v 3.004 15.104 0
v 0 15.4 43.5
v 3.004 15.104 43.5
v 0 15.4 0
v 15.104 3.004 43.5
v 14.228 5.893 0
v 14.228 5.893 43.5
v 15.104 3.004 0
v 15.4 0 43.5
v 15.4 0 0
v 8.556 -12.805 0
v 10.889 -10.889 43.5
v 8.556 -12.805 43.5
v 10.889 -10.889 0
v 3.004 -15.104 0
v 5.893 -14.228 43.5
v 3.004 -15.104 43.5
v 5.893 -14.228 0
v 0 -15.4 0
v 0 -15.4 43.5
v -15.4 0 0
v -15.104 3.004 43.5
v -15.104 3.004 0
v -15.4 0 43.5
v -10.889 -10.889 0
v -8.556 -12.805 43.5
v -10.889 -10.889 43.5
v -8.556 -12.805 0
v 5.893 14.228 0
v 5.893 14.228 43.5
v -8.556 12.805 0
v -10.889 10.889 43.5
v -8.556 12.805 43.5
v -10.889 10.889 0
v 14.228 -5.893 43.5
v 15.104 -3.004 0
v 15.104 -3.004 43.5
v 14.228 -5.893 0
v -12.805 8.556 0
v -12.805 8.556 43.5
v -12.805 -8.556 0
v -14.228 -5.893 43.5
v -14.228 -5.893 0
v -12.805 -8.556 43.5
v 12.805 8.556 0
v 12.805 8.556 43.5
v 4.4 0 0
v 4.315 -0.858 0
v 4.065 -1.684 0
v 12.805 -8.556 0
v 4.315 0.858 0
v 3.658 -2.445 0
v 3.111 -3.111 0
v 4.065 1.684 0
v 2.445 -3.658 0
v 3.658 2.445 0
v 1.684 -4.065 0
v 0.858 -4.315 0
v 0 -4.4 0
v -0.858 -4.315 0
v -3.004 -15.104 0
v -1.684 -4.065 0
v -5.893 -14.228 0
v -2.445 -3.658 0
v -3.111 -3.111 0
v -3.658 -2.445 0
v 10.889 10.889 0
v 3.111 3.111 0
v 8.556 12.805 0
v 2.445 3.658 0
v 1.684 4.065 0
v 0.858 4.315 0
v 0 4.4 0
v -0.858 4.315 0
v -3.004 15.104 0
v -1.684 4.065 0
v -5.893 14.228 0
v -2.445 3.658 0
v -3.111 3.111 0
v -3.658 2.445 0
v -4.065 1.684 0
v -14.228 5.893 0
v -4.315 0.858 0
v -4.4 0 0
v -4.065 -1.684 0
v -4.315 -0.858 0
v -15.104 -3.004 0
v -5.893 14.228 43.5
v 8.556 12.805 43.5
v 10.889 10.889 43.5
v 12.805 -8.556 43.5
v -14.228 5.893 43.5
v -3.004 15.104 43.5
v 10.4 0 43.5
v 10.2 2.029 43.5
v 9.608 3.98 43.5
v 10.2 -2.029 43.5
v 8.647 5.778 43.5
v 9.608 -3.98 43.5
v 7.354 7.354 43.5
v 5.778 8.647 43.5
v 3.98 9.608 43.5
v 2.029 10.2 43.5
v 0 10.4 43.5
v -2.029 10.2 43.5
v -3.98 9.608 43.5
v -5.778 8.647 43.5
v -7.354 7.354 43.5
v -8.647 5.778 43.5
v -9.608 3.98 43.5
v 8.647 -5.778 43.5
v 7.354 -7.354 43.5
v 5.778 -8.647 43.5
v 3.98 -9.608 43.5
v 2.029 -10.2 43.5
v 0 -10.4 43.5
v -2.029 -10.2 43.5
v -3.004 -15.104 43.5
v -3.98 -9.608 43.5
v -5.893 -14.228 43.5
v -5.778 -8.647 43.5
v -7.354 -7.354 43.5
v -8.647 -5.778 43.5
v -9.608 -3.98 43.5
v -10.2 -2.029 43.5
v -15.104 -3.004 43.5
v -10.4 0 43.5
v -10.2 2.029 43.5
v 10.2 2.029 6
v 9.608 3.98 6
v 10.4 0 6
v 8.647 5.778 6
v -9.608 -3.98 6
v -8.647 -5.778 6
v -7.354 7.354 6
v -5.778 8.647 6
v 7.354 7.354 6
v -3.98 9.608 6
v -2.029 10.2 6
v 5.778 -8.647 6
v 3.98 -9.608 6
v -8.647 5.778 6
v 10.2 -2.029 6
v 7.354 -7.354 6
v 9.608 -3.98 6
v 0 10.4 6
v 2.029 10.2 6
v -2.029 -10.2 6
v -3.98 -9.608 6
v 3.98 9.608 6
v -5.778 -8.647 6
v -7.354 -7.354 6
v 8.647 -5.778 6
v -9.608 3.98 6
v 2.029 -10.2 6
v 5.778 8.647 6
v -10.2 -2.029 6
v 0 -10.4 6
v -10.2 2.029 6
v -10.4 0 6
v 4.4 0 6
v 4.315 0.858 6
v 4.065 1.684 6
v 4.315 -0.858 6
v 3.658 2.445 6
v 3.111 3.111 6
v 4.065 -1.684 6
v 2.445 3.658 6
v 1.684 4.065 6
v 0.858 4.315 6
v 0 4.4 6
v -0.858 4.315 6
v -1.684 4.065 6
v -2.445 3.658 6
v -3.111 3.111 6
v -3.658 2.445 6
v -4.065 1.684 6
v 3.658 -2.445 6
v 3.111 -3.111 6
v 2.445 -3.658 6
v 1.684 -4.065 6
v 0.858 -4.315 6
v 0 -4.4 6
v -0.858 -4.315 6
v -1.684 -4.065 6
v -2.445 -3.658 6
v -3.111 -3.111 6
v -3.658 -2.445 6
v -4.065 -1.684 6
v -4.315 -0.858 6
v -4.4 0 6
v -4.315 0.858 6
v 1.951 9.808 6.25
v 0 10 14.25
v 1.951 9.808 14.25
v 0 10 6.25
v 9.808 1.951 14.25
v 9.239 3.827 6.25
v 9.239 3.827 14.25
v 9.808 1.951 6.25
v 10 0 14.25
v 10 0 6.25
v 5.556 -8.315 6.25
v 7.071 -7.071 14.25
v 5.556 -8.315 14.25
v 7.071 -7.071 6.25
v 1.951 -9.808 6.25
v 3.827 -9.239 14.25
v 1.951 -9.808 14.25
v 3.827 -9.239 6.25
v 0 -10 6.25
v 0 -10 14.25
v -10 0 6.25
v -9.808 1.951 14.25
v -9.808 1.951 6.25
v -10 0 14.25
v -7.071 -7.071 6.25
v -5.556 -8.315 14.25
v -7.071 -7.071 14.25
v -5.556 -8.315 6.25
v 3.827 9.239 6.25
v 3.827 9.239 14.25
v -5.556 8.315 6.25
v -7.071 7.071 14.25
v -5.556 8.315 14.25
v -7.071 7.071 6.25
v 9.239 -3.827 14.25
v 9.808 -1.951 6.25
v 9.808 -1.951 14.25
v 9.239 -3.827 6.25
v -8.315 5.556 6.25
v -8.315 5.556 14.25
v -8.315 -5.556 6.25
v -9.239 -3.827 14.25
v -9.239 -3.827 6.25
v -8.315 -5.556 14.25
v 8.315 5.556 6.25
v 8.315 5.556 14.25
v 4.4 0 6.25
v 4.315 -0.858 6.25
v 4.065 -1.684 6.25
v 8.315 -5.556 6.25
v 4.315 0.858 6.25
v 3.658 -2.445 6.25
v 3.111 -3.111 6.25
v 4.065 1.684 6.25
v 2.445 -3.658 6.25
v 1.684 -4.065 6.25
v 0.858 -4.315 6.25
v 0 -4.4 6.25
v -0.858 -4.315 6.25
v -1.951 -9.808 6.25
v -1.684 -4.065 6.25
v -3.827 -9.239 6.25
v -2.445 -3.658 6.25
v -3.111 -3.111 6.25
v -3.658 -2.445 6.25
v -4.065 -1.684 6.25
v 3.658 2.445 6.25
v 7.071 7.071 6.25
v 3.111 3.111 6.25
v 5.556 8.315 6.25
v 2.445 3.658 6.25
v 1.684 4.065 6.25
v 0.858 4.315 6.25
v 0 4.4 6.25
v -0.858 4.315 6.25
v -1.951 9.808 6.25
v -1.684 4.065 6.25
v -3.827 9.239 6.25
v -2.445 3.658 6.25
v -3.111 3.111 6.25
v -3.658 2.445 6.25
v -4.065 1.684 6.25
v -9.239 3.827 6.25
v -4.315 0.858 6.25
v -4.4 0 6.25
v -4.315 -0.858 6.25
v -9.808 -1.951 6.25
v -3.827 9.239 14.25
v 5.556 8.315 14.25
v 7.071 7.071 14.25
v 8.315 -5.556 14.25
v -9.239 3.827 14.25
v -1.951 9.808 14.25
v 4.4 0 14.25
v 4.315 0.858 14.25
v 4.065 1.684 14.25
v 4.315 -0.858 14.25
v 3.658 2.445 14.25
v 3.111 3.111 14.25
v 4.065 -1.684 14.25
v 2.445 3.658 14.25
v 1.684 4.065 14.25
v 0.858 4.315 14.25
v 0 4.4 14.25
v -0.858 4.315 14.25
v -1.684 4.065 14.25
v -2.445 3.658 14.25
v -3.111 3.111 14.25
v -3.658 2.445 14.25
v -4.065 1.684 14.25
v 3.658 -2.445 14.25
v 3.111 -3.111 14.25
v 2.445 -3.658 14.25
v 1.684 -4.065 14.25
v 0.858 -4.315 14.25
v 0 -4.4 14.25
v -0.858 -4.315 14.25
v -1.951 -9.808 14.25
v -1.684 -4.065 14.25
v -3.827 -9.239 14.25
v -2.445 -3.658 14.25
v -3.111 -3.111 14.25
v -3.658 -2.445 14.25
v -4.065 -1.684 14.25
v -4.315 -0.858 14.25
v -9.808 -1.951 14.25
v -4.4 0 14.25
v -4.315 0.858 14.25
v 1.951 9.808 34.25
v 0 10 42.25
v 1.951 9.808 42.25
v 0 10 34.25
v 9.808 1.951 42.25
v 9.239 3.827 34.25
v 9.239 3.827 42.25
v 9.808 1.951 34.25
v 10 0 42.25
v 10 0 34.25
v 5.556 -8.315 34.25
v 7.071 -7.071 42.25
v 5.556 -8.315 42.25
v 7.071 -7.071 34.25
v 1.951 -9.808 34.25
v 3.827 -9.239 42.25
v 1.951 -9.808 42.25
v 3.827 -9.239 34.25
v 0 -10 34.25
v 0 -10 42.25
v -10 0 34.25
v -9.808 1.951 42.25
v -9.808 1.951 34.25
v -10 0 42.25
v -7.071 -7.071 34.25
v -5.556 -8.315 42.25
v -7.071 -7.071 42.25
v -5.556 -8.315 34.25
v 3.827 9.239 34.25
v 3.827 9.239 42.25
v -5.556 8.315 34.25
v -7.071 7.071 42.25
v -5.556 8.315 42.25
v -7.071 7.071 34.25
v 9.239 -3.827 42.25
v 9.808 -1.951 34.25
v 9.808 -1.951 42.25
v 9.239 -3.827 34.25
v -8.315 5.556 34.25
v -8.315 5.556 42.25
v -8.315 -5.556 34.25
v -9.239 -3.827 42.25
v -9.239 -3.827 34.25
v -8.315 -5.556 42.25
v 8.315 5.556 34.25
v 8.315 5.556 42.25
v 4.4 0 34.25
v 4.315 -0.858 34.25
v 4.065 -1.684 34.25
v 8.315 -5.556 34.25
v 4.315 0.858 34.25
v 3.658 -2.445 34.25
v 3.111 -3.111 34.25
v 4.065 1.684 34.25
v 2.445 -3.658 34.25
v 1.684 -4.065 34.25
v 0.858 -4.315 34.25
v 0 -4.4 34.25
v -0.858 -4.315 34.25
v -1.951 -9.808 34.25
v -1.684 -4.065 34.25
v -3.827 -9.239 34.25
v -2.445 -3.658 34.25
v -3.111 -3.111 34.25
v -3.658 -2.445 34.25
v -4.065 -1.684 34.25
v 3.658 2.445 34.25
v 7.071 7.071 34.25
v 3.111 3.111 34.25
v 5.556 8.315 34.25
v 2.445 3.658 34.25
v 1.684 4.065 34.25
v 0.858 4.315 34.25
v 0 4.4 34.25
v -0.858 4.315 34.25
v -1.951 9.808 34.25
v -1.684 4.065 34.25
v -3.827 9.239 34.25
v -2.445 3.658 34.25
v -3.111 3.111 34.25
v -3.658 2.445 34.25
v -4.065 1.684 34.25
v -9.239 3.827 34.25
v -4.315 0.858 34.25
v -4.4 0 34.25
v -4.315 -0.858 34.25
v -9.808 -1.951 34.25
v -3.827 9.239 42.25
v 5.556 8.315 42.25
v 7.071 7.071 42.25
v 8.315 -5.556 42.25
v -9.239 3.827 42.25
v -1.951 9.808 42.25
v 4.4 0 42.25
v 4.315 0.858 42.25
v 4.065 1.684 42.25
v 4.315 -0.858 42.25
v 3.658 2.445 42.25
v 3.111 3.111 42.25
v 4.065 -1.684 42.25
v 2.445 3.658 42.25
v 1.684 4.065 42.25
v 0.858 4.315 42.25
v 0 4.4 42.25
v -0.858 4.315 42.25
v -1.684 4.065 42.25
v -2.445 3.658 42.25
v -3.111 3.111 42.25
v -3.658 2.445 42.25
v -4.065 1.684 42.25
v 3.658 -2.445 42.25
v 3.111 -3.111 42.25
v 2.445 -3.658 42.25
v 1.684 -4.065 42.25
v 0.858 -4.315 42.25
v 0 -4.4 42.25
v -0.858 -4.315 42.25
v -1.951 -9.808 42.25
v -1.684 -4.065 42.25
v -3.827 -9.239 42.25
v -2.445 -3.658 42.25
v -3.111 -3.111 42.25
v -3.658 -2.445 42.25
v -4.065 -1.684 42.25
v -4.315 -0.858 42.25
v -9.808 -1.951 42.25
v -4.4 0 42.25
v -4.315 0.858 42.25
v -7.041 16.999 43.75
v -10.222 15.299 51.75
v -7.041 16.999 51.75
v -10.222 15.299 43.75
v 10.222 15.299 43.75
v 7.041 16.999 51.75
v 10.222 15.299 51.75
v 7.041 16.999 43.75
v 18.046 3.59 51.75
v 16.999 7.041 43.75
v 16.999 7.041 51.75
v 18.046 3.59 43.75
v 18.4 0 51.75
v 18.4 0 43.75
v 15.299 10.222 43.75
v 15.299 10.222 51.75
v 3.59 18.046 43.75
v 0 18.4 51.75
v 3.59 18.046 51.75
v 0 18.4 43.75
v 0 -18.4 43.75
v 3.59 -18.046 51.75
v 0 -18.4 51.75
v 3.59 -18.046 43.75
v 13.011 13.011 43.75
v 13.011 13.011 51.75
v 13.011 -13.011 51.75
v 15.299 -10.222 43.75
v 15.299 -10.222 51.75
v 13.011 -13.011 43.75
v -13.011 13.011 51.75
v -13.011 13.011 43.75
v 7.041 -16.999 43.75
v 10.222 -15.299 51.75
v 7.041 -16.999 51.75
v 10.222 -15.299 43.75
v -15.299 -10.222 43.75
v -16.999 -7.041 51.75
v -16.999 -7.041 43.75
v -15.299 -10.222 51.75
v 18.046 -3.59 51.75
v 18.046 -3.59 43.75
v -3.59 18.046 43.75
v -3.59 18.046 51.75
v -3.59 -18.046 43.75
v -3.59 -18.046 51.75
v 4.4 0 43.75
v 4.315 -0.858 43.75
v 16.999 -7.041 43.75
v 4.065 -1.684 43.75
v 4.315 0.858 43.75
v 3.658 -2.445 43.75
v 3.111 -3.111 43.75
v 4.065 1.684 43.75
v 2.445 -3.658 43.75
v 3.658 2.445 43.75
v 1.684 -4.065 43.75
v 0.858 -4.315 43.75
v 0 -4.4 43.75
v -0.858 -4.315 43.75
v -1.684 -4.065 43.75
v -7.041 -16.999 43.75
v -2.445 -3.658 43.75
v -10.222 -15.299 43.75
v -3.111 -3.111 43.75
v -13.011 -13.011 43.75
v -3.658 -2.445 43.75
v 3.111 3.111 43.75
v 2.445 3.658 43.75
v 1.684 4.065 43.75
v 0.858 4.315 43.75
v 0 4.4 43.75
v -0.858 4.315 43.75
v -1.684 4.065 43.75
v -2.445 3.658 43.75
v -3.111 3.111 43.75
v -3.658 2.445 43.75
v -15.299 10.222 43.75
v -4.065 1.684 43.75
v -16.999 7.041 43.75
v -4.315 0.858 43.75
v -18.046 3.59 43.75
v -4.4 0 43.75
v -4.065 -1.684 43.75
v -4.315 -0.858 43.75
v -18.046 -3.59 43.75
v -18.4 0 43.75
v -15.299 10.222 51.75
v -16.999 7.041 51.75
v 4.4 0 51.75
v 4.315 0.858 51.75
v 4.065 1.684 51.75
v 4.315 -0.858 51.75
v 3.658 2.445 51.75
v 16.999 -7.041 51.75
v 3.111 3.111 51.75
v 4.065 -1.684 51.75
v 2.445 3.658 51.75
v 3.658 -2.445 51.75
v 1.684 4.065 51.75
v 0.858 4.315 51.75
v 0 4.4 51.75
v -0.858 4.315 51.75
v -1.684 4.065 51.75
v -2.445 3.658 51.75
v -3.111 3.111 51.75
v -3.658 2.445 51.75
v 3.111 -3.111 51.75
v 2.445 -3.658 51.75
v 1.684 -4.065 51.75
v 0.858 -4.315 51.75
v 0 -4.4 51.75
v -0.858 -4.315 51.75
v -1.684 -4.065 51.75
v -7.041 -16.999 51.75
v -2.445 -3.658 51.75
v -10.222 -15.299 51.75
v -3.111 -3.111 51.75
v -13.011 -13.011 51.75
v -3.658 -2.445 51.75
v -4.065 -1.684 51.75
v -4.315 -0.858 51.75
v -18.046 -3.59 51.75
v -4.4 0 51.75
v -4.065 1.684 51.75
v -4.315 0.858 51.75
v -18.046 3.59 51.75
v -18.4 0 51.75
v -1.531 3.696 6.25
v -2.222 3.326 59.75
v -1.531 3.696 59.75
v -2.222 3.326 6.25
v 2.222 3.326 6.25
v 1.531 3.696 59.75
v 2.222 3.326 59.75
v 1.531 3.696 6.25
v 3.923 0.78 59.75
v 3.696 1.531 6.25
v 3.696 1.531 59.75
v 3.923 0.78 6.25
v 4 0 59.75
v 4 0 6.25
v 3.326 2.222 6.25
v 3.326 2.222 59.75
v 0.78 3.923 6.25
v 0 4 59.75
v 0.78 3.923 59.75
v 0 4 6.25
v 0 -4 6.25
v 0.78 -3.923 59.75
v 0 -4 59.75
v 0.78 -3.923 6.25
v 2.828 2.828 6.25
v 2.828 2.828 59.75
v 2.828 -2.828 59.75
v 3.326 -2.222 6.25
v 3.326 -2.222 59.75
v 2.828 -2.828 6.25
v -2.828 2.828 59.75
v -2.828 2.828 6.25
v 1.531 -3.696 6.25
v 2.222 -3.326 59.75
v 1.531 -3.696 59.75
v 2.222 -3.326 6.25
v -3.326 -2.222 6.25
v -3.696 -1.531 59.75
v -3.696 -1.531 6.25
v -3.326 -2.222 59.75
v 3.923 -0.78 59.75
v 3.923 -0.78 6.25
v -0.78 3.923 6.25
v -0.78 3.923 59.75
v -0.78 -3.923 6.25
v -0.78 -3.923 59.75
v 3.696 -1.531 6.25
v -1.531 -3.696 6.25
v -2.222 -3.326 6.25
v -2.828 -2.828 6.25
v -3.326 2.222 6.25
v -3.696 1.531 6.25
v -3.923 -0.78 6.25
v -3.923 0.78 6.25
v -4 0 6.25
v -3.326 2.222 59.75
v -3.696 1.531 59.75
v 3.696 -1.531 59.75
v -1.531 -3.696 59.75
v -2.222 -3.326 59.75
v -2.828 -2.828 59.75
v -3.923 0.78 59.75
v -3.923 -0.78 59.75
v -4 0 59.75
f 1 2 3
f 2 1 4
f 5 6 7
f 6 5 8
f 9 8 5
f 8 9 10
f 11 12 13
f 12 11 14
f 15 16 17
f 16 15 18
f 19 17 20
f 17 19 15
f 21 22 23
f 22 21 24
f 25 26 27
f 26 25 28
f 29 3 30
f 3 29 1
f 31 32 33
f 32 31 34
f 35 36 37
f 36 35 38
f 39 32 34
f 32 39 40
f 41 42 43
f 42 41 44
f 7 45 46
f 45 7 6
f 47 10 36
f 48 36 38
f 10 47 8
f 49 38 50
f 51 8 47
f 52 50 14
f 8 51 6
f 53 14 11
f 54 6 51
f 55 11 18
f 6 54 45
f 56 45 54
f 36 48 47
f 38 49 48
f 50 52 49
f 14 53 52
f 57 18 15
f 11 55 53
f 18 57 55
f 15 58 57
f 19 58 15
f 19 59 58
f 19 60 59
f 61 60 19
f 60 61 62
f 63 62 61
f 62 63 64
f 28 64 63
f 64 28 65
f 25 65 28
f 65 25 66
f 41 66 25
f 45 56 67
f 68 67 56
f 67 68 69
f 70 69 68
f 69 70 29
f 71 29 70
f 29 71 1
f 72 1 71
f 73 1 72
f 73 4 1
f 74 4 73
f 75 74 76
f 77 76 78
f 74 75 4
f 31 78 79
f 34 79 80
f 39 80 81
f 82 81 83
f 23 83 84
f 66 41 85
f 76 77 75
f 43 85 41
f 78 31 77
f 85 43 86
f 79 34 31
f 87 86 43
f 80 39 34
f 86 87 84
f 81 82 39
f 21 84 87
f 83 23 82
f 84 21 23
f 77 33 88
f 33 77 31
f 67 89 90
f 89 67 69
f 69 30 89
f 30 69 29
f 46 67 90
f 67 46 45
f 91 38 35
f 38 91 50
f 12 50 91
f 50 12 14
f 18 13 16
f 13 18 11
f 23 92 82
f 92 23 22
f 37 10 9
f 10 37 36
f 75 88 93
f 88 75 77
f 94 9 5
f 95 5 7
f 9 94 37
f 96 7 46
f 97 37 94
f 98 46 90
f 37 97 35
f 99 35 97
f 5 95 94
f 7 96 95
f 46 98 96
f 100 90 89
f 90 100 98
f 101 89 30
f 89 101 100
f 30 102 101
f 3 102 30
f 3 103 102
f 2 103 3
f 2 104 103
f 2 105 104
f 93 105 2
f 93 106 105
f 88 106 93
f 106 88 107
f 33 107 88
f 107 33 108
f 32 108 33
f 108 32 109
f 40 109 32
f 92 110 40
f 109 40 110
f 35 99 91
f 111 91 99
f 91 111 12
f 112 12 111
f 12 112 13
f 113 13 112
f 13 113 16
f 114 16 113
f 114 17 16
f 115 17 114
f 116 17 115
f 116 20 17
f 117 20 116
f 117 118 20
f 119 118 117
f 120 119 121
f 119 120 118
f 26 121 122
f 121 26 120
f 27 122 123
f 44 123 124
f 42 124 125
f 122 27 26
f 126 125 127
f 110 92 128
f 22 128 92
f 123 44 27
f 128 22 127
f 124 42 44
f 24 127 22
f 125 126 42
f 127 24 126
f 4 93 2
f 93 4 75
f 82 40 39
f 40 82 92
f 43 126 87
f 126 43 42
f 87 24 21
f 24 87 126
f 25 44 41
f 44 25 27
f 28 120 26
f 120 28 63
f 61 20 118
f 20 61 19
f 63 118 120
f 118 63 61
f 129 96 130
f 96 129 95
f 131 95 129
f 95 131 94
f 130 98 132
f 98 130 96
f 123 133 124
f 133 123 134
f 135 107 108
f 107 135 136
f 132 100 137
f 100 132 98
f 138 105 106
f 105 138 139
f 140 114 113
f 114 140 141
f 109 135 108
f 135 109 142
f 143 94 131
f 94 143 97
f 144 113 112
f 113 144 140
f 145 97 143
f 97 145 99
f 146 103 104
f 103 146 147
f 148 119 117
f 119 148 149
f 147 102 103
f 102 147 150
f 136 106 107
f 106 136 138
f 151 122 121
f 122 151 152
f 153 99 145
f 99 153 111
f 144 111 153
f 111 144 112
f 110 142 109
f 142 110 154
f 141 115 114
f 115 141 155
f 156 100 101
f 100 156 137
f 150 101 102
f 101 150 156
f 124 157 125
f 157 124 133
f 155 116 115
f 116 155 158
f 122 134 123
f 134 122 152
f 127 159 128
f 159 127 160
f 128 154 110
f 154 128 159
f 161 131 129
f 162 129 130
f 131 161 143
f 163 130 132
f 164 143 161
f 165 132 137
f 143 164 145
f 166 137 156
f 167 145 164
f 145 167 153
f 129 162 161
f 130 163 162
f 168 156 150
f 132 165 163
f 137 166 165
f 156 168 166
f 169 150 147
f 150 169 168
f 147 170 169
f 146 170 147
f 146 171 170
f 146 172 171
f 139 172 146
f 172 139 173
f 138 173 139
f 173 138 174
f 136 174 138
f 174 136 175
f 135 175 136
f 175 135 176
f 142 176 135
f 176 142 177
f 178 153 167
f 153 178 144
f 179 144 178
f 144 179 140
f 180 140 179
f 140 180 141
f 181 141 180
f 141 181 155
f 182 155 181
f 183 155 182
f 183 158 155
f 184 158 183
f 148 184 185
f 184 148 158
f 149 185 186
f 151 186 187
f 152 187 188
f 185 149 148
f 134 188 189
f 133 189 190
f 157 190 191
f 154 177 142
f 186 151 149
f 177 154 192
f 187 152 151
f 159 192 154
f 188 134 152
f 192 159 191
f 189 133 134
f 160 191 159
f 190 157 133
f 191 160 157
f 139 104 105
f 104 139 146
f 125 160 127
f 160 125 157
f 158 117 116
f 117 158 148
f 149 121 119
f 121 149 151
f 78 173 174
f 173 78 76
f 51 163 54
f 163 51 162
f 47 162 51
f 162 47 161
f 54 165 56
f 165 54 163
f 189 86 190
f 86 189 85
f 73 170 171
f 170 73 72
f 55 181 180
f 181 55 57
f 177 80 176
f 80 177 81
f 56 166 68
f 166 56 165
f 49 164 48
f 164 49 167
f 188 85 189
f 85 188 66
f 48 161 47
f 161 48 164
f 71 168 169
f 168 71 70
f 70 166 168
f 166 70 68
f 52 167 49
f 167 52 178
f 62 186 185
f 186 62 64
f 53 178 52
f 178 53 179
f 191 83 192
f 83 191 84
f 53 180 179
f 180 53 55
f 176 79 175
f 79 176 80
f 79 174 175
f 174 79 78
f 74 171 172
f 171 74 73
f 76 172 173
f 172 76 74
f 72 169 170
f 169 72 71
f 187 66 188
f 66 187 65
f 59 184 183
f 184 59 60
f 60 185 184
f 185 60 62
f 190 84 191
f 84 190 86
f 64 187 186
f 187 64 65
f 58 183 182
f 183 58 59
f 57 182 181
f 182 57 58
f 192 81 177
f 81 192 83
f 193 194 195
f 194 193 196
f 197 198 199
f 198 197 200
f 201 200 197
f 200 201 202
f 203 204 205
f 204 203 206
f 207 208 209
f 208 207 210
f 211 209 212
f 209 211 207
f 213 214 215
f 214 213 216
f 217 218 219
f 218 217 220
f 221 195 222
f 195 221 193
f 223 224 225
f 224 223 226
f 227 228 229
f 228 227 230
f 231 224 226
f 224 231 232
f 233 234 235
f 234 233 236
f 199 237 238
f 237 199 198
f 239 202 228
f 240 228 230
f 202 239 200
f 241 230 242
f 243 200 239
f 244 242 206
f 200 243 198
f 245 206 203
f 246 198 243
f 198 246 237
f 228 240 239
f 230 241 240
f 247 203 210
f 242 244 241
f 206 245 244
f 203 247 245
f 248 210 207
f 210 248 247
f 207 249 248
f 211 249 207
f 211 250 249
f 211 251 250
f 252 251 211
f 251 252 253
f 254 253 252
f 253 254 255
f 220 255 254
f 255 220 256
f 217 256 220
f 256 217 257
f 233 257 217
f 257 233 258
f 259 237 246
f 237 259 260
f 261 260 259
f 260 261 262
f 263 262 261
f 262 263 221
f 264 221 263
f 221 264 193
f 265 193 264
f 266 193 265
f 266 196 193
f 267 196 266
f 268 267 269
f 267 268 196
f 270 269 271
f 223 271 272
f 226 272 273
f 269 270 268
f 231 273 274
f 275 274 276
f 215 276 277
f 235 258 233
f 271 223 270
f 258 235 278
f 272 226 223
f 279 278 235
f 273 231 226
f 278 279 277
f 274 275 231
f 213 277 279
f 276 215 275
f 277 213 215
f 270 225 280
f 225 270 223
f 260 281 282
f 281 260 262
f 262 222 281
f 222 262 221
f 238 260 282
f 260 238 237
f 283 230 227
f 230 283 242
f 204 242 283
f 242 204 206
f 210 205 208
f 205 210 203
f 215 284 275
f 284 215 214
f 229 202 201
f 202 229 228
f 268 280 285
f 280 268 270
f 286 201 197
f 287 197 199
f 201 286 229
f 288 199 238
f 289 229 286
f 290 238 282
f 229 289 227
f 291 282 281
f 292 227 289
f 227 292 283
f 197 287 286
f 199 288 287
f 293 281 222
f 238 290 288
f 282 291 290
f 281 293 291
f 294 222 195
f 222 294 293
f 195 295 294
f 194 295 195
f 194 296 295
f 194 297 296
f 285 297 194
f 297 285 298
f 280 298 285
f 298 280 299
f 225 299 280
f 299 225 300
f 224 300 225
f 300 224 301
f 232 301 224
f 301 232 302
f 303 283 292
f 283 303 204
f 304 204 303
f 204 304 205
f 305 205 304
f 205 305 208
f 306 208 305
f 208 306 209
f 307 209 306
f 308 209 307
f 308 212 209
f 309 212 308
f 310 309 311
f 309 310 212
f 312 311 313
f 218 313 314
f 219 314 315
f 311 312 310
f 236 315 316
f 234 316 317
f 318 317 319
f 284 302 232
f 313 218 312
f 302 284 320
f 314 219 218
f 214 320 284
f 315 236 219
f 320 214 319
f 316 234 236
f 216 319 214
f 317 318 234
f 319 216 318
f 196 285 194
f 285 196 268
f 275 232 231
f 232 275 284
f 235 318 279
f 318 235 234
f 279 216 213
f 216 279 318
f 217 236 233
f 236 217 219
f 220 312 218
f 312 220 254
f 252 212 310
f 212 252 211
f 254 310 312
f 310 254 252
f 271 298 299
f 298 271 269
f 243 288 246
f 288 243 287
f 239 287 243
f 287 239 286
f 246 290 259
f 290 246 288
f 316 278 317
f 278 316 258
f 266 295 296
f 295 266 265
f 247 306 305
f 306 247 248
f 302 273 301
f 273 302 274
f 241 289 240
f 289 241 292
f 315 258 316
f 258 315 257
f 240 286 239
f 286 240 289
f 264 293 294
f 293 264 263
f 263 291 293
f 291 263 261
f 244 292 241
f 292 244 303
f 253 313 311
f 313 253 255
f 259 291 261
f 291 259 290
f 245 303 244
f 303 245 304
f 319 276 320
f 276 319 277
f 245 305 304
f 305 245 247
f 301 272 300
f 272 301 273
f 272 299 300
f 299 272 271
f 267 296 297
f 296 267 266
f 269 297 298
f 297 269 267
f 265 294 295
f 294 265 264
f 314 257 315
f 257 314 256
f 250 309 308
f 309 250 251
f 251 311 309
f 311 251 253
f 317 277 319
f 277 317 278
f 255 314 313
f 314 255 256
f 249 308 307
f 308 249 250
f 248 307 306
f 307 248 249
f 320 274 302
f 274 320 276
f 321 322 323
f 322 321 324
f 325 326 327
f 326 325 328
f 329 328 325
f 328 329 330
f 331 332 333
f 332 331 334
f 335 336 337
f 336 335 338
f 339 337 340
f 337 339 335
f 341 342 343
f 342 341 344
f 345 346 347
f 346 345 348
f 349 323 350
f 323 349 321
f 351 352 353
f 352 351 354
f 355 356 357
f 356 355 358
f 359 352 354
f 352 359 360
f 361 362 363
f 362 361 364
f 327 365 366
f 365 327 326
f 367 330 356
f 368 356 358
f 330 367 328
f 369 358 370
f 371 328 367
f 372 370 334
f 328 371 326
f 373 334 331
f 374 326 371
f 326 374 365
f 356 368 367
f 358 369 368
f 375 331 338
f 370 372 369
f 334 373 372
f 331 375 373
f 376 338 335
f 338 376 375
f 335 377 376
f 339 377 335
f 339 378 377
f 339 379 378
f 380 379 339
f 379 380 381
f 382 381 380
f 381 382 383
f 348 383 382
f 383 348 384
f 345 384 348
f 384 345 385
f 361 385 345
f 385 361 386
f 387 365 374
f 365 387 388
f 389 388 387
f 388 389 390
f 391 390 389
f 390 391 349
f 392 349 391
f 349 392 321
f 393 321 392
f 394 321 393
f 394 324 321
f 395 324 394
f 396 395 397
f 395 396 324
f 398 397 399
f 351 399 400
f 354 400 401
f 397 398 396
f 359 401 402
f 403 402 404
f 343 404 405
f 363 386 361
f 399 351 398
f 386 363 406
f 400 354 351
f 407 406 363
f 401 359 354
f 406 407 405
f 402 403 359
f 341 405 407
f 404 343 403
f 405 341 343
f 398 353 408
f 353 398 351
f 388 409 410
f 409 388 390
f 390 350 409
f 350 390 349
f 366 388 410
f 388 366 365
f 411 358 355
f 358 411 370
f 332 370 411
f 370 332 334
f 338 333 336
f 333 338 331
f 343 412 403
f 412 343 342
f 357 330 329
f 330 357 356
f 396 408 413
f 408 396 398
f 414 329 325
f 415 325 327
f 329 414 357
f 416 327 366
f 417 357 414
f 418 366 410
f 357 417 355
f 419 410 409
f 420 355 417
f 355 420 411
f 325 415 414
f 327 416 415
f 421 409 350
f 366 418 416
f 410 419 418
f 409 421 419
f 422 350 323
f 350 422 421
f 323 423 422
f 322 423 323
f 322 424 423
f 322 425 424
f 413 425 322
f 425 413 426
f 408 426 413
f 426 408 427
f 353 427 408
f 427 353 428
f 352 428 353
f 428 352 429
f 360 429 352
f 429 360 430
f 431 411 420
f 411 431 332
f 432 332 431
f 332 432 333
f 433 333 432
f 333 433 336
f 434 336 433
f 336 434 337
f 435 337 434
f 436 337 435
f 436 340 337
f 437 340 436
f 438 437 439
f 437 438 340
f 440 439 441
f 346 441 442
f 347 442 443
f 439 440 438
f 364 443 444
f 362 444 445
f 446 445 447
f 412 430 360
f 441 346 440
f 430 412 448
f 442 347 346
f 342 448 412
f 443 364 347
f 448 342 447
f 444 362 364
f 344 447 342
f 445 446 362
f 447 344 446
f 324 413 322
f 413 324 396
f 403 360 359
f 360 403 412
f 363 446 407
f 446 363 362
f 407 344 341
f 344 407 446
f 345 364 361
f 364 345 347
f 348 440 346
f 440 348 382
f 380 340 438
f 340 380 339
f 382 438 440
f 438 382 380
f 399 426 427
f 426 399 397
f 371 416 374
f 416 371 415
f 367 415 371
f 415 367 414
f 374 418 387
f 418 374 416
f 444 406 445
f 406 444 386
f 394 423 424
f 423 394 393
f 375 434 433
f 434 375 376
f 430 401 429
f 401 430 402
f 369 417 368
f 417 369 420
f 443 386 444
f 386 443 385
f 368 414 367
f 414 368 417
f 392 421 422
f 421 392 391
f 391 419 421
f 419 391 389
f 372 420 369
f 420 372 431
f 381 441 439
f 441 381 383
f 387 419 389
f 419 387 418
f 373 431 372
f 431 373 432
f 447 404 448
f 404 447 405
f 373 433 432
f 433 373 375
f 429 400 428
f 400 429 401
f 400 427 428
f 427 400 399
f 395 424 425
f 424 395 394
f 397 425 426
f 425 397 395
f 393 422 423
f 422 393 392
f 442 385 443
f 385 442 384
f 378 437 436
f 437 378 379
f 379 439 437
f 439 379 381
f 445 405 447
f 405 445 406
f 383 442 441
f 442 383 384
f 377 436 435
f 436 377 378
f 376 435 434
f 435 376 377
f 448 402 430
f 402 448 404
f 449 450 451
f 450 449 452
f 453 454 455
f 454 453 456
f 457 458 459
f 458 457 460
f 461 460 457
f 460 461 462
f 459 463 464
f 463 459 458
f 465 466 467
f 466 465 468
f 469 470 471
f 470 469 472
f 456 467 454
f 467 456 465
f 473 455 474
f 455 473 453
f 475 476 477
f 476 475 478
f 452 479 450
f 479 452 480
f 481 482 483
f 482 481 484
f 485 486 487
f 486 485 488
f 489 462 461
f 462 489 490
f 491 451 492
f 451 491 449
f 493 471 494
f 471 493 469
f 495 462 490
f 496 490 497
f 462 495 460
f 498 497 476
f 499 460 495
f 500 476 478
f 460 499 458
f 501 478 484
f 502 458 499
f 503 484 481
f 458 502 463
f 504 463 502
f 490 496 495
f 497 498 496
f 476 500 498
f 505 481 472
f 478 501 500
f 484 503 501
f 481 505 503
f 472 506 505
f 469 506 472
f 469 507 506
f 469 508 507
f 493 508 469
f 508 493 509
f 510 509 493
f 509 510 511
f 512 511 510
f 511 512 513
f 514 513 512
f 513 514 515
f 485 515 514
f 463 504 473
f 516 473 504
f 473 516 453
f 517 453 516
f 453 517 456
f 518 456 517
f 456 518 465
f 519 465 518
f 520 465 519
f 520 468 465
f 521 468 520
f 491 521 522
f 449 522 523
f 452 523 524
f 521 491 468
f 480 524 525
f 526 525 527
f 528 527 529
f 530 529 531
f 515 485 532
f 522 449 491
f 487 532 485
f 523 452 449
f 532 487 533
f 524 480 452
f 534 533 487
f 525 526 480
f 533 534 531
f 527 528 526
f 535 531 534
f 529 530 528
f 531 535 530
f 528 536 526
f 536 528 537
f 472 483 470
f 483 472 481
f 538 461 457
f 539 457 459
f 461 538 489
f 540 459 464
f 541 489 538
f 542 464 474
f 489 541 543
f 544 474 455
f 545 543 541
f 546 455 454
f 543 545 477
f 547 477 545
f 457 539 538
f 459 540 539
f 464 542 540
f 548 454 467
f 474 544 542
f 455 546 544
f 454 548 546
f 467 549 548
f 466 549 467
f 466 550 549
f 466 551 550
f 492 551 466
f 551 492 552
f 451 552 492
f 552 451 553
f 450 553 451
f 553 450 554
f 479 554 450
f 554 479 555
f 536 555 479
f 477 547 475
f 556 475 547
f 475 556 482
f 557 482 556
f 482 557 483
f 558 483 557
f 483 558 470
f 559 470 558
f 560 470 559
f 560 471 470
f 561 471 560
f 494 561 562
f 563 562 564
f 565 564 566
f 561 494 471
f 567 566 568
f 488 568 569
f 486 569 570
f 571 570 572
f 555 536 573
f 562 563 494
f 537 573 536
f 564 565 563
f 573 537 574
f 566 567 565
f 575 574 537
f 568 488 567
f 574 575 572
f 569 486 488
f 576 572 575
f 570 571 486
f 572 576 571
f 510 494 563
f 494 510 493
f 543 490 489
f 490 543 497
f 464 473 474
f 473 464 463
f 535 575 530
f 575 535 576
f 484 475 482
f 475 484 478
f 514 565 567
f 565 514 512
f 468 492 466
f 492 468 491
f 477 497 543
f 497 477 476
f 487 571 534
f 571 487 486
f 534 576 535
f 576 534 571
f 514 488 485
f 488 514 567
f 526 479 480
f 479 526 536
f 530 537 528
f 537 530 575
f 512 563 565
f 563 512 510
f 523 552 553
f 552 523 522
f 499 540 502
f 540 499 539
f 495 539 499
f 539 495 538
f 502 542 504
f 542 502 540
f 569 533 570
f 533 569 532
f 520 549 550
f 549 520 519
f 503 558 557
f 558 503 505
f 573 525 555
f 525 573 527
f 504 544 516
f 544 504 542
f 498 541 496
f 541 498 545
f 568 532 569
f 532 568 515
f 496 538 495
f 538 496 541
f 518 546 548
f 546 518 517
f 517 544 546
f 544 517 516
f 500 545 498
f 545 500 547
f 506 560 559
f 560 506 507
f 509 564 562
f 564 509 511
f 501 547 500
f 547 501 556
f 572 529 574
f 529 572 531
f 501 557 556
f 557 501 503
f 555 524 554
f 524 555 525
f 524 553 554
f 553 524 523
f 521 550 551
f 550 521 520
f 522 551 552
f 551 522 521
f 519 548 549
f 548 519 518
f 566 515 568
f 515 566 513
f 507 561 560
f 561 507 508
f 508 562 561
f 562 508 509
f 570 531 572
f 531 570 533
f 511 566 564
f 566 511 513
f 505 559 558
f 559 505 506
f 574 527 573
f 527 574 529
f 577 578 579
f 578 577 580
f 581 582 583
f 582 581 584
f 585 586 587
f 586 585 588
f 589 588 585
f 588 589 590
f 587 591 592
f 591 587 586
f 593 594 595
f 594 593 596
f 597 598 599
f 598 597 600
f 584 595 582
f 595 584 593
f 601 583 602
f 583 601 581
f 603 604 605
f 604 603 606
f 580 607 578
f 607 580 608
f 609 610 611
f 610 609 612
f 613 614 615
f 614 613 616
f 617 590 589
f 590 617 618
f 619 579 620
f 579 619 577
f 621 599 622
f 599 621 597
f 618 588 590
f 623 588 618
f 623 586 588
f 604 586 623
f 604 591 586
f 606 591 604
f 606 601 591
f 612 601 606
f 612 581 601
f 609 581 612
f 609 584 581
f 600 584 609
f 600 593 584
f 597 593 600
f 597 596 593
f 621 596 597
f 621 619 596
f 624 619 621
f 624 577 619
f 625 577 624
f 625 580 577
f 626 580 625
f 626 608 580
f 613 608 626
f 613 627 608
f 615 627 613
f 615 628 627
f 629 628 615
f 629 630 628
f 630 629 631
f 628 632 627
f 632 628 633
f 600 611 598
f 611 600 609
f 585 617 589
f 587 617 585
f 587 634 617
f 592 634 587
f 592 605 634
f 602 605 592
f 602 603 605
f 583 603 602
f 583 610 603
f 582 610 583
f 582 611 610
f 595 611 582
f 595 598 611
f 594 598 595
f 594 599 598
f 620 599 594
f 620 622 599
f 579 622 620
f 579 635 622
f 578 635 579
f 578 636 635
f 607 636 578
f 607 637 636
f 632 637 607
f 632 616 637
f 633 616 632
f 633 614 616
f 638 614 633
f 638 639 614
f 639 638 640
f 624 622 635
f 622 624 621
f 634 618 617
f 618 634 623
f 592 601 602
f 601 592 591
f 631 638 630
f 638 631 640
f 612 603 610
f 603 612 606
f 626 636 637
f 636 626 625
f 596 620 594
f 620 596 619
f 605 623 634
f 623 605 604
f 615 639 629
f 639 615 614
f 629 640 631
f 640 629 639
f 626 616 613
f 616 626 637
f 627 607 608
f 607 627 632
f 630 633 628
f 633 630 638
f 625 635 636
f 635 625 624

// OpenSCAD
$fn = 32;

// ------------------------------------------------------------------------
// Shaft station: cup d30.8 x 43.5 mm, shaft d8
// Every part is its own module, assembly() places every instance.
// ------------------------------------------------------------------------

// --- part 1 ---
module housing_cup() {
  difference() {
    cylinder(h = 43.5, d = 30.8);
    translate([0, 0, 6]) cylinder(h = 38.5, d = 20.8);
    translate([0, 0, -1]) cylinder(h = 8, d = 8.8);
  }
}

// --- part 2 ---
module bearing_lower() {
  difference() {
      translate([0, 0, 0]) cylinder(h = 8, d = 20);
      translate([0, 0, -1]) cylinder(h = 10, d = 8.8);
    }
}

// --- part 3 ---
module bearing_upper() {
  difference() {
      translate([0, 0, 0]) cylinder(h = 8, d = 20);
      translate([0, 0, -1]) cylinder(h = 10, d = 8.8);
    }
}

// --- part 4 ---
module station_shaft() {
  translate([0, 0, -26.75]) cylinder(h = 53.5, d = 8);
}

// --- part 5 ---
module station_cover() {
  difference() {
    cylinder(h = 8, d = 36.8);
    translate([0, 0, -1]) cylinder(h = 10, d = 8.8);
  }
}

// --- assembly ---
module assembly() {
  color([0.80, 0.24, 0.20]) translate([0, 0, 0]) rotate([0, 0, 0]) housing_cup();
  color([0.20, 0.45, 0.75]) translate([0, 0, 6.25]) rotate([0, 0, 0]) bearing_lower();
  color([0.25, 0.62, 0.32]) translate([0, 0, 34.25]) rotate([0, 0, 0]) bearing_upper();
  color([0.92, 0.70, 0.18]) translate([0, 0, 33]) rotate([0, 0, 0]) station_shaft();
  color([0.58, 0.35, 0.70]) translate([0, 0, 43.75]) rotate([0, 0, 0]) station_cover();
}

assembly();
